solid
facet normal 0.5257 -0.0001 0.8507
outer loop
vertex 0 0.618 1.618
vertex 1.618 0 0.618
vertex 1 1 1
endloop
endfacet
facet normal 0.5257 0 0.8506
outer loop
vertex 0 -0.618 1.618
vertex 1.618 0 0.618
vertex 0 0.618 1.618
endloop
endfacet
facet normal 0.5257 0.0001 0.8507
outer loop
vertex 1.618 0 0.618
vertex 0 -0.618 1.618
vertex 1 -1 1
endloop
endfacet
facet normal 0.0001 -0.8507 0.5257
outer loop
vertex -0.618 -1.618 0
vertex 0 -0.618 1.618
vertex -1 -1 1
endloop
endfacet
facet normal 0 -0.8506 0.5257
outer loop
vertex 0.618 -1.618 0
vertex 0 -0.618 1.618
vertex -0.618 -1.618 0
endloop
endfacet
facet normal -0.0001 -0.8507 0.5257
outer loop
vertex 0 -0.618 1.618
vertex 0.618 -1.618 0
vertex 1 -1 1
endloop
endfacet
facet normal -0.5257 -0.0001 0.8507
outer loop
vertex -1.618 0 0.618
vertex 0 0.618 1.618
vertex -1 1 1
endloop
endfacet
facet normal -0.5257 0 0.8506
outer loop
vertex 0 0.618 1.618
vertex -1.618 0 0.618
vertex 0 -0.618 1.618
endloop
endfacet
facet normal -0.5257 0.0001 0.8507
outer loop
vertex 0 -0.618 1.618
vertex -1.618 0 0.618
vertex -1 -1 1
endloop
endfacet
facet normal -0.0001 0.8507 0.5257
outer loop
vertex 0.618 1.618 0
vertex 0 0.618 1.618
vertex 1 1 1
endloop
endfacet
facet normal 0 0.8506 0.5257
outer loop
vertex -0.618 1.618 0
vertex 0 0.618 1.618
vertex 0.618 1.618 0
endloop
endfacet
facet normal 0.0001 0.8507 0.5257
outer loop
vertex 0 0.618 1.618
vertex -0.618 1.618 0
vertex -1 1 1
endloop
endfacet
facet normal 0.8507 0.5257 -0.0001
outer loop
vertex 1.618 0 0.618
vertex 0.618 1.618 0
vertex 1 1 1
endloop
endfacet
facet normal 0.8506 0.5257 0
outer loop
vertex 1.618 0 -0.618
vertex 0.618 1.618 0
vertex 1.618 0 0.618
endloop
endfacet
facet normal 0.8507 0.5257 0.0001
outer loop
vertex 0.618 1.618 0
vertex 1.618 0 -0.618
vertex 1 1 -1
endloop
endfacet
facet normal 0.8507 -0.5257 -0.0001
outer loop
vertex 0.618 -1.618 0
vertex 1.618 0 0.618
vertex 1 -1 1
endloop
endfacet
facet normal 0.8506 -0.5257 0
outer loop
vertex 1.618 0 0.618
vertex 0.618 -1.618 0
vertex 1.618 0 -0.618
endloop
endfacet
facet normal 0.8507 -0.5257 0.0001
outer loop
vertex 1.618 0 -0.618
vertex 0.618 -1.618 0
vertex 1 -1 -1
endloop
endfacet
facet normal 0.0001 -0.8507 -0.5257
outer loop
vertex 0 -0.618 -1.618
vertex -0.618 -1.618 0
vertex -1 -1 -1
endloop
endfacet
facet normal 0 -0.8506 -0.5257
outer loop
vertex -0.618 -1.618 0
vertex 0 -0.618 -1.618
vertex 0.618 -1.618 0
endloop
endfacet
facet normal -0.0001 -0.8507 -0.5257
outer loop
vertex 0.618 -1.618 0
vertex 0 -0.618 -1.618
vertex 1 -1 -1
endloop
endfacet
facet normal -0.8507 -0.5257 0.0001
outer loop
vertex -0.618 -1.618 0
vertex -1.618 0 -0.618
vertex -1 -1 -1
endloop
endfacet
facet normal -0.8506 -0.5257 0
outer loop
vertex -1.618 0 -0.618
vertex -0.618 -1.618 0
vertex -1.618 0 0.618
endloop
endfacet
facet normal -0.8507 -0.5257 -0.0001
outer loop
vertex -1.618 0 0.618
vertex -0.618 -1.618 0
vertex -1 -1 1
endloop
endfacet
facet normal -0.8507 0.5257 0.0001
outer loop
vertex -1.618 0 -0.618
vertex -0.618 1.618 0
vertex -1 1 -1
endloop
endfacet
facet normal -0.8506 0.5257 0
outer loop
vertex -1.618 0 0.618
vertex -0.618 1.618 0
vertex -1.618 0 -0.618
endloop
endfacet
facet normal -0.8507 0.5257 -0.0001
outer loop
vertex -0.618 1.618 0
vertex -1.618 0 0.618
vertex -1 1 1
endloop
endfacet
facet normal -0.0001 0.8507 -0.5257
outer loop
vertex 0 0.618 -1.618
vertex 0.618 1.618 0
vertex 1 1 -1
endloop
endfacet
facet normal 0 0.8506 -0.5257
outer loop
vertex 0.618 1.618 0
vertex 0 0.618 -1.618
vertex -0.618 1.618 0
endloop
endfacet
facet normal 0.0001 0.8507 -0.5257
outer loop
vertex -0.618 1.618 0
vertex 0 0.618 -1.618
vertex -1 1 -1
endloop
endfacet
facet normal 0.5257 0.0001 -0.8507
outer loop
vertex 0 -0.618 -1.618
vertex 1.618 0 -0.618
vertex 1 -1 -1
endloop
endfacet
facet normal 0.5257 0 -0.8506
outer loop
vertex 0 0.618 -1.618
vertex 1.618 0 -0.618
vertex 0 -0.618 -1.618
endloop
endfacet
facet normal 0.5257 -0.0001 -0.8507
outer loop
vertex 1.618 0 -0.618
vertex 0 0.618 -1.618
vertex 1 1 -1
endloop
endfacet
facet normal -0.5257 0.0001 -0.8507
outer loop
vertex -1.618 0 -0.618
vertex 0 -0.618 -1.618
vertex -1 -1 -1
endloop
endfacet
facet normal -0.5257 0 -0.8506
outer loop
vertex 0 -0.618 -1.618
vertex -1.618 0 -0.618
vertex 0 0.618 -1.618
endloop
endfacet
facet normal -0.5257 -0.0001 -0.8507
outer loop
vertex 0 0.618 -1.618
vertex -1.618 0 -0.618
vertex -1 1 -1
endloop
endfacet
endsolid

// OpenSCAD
Cphi = (sqrt(5)+1)/2;

dodeca_cart = [ 
[+1, +1, +1], // 0, 0
[+1, -1, +1], // 0, 1
[-1, -1, +1], // 0, 2
[-1, +1, +1], // 0, 3

[+1, +1, -1], // 1, 4
[-1, +1, -1], // 1, 5
[-1, -1, -1], // 1, 6
[+1, -1, -1], // 1, 7

[0, +1/Cphi, +Cphi], // 2, 8
[0, -1/Cphi, +Cphi], // 2, 9
[0, -1/Cphi, -Cphi], // 2, 10
[0, +1/Cphi, -Cphi], // 2, 11

[-1/Cphi, +Cphi, 0], // 3, 12
[+1/Cphi, +Cphi, 0], // 3, 13
[+1/Cphi, -Cphi, 0], // 3, 14
[-1/Cphi, -Cphi, 0], // 3, 15

[-Cphi, 0, +1/Cphi], // 4, 16
[+Cphi, 0, +1/Cphi], // 4, 17
[+Cphi, 0, -1/Cphi], // 4, 18
[-Cphi, 0, -1/Cphi], // 4, 19
];


//color([0.5,0.5,0.5,0.5]) 
//polyhedron(points=dodeca_cart,
//triangles=[ 
//
//[1,9,8],
//[1,8,0],
//[1,0,17],
//
//[9,1,14],
//[9,14,15],
//[9,15,2],
//
//[9,2,16],
//[9,16,3],
//[9,3,8],
//
//[8,3,12],
//[8,12,13],
//[8,13,0],
//
//[0,13,4],
//[0,4,18],
//[0,18,17],
//
//[1,17,18],
//[1,18,7],
//[1,7,14],
//
//[15,14,7],
//[15,7,10],
//[15,10,6],
//
//[2,15,6],
//[2,6,19],
//[2,19,16],
//
//[16,19,5],
//[16,5,12],
//[16,12,3],
//
//[12,5,11],
//[12,11,4],
//[12,4,13],
//
//[18,4,11],
//[18,11,10],
//[18,10,7],
//
//[19,6,10],
//[19,10,11],
//[19,11,5]
//
//]
//);

polyhedron(points=dodeca_cart,
triangles=[
[1,9,8,0,17],
[9,1,14,15,2],
[9,2,16,3,8],
[8,3,12,13,0],
[0,13,4,18,17],
[1,17,18,7,14],
[15,14,7,10,6],
[2,15,6,19,16],
[16,19,5,12,3],
[12,5,11,4,13],
[18,4,11,10,7],
[19,6,10,11,5]
]
);
